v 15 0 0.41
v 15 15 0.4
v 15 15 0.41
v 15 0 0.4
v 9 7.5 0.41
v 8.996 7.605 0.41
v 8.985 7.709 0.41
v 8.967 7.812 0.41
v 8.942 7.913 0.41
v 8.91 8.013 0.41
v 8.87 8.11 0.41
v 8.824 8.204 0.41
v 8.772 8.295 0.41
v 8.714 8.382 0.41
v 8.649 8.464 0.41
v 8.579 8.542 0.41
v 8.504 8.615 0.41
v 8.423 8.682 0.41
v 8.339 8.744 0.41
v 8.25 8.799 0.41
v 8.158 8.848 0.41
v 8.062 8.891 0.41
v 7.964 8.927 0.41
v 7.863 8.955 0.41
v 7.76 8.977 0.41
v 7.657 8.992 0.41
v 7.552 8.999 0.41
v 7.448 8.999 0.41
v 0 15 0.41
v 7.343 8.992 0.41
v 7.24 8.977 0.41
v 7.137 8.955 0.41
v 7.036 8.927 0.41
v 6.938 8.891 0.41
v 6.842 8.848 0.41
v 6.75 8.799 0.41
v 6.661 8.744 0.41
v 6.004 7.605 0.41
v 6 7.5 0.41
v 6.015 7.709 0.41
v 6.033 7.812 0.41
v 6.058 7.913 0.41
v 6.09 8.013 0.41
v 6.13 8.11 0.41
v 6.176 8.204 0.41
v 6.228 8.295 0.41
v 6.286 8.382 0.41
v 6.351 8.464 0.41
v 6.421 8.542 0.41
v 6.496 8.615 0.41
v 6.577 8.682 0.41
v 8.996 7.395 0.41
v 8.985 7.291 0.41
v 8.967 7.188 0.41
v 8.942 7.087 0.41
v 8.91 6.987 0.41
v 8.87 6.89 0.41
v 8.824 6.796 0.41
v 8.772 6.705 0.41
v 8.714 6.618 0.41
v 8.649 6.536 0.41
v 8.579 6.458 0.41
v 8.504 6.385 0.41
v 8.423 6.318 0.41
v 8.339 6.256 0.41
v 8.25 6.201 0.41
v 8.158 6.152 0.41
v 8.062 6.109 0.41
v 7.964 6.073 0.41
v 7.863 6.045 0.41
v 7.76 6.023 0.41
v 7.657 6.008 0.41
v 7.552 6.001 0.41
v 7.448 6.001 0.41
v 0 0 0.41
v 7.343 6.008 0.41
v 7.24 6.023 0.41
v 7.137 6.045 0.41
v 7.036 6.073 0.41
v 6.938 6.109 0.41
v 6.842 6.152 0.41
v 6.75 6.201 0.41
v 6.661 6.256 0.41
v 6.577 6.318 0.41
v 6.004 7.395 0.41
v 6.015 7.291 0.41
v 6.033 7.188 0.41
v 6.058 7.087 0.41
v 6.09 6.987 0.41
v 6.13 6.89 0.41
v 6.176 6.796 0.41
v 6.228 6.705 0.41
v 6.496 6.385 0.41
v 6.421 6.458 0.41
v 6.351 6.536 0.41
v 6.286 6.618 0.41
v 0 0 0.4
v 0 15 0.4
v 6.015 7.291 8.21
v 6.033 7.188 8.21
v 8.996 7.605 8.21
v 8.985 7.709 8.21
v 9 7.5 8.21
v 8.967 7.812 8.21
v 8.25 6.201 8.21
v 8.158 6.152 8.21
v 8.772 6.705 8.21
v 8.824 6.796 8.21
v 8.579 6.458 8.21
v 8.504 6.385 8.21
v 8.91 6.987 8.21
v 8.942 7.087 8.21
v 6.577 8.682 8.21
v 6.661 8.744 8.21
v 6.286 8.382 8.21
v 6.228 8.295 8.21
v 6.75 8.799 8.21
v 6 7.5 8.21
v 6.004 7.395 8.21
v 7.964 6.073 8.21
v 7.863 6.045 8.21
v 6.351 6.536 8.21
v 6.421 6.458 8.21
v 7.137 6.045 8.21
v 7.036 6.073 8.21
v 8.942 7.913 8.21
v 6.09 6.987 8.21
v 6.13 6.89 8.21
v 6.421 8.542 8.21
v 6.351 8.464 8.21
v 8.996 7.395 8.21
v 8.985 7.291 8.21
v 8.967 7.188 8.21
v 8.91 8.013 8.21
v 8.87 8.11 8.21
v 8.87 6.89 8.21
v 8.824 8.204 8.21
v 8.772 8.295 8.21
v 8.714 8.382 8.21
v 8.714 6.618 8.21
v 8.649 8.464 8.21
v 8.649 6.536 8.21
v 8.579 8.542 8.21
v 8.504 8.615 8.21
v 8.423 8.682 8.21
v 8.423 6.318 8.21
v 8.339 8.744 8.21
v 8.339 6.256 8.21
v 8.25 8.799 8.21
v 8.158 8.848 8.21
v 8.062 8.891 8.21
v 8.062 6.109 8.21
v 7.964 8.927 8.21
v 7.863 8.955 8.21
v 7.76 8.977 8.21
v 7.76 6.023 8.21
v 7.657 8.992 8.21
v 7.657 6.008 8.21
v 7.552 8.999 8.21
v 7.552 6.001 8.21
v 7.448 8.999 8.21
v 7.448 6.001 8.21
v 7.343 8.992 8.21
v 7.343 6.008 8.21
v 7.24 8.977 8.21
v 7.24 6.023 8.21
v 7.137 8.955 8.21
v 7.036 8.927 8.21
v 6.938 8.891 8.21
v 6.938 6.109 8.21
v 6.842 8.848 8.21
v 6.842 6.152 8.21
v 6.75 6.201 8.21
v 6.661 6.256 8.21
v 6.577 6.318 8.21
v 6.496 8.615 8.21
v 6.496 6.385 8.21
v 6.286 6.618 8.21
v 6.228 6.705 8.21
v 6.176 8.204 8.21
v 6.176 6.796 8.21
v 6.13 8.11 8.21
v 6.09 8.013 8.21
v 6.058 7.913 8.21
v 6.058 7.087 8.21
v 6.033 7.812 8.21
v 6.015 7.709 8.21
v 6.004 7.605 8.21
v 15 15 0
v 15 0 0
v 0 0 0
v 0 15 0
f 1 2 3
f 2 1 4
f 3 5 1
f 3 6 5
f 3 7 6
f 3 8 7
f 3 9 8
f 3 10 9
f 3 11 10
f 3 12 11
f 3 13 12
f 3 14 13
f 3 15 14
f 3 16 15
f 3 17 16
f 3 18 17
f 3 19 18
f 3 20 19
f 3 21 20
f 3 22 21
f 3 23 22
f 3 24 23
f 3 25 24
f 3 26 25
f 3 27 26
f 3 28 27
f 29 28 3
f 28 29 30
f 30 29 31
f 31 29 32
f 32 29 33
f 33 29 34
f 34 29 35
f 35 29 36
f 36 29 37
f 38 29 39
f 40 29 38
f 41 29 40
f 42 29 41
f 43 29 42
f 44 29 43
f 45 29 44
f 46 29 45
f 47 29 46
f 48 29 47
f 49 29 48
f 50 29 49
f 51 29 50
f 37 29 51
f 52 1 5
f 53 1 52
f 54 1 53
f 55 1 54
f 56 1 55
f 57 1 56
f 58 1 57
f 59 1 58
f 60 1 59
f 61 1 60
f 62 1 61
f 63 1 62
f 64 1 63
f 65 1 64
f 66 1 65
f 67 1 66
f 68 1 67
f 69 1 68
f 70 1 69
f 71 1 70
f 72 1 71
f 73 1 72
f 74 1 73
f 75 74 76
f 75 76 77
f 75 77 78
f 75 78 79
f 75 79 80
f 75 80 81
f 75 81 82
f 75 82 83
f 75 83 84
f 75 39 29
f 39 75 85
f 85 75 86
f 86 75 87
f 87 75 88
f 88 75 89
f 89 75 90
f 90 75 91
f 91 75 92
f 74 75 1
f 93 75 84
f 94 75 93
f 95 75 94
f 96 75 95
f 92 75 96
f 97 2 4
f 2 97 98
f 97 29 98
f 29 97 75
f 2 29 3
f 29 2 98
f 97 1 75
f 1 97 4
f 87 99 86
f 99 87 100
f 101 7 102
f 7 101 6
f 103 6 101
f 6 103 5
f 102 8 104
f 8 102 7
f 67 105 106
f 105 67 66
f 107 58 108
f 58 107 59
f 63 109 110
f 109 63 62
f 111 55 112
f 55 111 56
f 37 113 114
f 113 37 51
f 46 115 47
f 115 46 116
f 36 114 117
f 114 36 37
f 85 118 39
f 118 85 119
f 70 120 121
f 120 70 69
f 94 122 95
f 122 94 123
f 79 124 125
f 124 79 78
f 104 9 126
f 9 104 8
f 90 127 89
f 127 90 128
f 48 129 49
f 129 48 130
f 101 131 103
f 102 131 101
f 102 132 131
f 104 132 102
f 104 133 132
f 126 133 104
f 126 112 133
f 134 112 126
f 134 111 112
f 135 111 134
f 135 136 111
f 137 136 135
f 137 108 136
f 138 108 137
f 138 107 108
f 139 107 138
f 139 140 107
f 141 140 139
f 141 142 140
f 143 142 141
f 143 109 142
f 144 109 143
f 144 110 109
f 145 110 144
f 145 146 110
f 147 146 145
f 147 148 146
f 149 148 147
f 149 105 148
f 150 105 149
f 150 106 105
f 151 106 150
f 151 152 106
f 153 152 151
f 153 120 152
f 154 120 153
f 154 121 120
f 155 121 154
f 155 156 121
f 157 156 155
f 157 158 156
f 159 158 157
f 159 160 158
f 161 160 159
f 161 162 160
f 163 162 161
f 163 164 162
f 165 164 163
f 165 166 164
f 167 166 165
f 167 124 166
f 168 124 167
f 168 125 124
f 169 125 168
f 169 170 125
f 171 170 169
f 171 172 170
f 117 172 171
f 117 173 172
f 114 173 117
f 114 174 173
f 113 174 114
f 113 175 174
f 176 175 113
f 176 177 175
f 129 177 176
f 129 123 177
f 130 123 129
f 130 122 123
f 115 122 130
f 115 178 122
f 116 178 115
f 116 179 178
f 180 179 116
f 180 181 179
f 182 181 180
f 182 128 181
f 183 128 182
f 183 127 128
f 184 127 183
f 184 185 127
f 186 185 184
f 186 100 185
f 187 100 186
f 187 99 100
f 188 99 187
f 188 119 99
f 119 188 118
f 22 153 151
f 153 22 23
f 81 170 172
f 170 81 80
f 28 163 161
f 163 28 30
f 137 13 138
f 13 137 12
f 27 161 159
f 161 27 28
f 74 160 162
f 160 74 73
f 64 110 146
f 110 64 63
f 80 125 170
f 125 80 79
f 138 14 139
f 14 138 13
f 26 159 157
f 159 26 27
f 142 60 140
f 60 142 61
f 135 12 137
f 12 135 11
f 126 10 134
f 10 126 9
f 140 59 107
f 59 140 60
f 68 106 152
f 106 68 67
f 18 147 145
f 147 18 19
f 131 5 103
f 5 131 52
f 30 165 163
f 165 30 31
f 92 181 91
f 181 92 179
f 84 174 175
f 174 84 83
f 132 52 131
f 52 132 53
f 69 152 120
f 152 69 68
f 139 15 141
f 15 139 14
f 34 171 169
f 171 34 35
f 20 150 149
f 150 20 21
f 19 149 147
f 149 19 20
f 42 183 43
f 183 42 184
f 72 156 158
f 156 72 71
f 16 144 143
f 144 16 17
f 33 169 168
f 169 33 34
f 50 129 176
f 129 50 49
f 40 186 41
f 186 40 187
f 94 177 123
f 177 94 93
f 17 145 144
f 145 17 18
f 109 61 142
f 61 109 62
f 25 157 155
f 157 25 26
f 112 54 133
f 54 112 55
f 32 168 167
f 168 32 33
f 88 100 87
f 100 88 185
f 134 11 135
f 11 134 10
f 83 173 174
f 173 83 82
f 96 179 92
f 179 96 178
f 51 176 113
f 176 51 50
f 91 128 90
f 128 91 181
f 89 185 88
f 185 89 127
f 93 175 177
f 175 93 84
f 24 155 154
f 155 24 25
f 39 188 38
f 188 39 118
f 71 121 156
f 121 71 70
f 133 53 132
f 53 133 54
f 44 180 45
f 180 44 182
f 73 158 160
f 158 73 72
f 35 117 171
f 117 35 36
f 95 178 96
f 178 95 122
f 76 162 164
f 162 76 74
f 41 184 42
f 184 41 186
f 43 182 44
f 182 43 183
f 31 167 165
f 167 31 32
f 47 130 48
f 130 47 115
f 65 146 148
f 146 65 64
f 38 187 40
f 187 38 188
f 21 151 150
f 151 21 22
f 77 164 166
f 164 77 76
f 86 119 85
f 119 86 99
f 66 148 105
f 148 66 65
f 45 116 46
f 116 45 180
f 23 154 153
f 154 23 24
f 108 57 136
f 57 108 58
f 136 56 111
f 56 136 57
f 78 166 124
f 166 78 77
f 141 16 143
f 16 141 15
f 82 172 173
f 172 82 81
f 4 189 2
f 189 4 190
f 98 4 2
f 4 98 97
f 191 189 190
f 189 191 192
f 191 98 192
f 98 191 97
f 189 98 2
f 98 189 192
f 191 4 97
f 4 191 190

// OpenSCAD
// file: ../../Base/Boxes.scad
// Fischertechnik Box Foundation
// Pre-designed Boxes

use <Constants.scad>

include <PlacementOptions.scad>

box190Width = 190;
box190Depth = 130;
box130Width = 130;
box130Depth = 95;
boxUsageHeight = 33.9;
boxWallThickness = 2.4;
boxBaseThickness = 1.0;
boxWebWidth = 3.0;

// getBoxWallThickness()
// Gets the wall thickness of a Fischertechnik Box

function getBoxWallThickness() = boxWallThickness;

// Gets the usable height of a fischertechnik box
function getBoxUsageHeight() = boxUsageHeight;

// Gets the thickness of the Fischertechnik box base.
function getBoxBaseThickness() = boxBaseThickness;

// Gets the width of a box web
function getBoxWebWidth() = boxWebWidth;

// Gets the usable inner space of a Box 190 as an x/y-list
function getBox190Space() = [
    box190Width - 2*getBoxWallThickness(), 
    box190Depth - 2*getBoxWallThickness() ];

// Imports the Fischertechnik empty box 130x190 mm and places it at position 0,0
// 190x130 are the outer sizes, the inner space is slightly smaller. Use getBox190Space() to get the inner sizes.
// This module needs the STL file "Fischertechnik Box 130x190.stl" in the library path.
// The box is positioned that the usable inner space is at the 0,0,0 position. The

module Box190() {
    translate([-getBoxWallThickness(),-getBoxWallThickness(),-getBoxBaseThickness()])
        import("Fischertechnik Box 130x190.stl", convexity=3);
}

// Gets the usable inner space of a Box 130 as an x/y-list
function getBox130Space() = [
    box130Width - 2*getBoxWallThickness(), 
    box130Depth - 2*getBoxWallThickness() ];

// Imports the Fischertechnik empty box 95x130 mm and places it at position 0,0
// 190x130 are the outer sizes, the inner space is slightly smaller. Use getBox190Space() to get the inner sizes.
// This module needs the STL file "Fischertechnik Box 95x130.stl" in the library path.
// The box is positioned that the usable inner space is at the 0,0,0 position. The

module Box130() {
    translate([-getBoxWallThickness(),-getBoxWallThickness(),-getBoxBaseThickness()])
        import("Fischertechnik Box 95x130.stl", convexity=3);
}

// Creates a web at the specified box walls
// corner 0 = LowerLeft, 1 = UpperLeft, 2 = UpperRight, 3 = LowerRight
// side 0 = LeftOfCorner, 1 = RightOfCorner
// distance = Distance in mm from the corner
// box = inner width and depth of the box (default: Box 190)
// webWidth = length of the web (default is 3 mms)
// webThickness = thickness of the web (default is 1 mm)

module BoxWeb(corner, side, distance, box=getBox190Space(), webWidth=getBoxWebWidth(), webThickness=1.0) {
    sink = getBoxWallThickness()/2;

    width = (corner % 2 == 0) ? 
            (side == LeftOfCorner ? webWidth : webThickness) :
            (side == LeftOfCorner ? webThickness : webWidth);

    depth = (corner % 2 == 0) ? 
            (side == RightOfCorner ? webWidth : webThickness) :
            (side == RightOfCorner ? webThickness : webWidth);
    
    xDiff = corner == LowerLeft ? 
                (side == LeftOfCorner ? -sink : distance) :
            (corner == UpperLeft ?                
                (side == LeftOfCorner ? distance : -sink) :
            (corner == UpperRight ?
                (side == LeftOfCorner ? box.x-webWidth+sink : box.x-distance-webThickness) :
                (side == LeftOfCorner ? box.x-distance-webThickness: box.x-webWidth+sink)));

    yDiff = corner == LowerLeft ? 
                (side == RightOfCorner ? -sink : distance) :
            (corner == UpperLeft ?
                (side == RightOfCorner ? box.y-distance : box.y-webWidth+sink) :
            (corner == UpperRight ?
                (side == RightOfCorner ? box.y-webWidth+sink : box.y-distance) :
                (side == RightOfCorner ? distance : -sink)));
    
    translate([xDiff, yDiff, -getExcess()])
        cube([width, depth, boxUsageHeight + 2*getExcess()]);
}
// file: ../../Base/Rotation.scad
// Fischertechnik Box Foundation
// Geometry Helpers Rotation

include <PlacementOptions.scad>

// getRotatedSpace(space, rotation=NoRotation)
// Rotates the space dependent on the specified rotation

function getRotatedSpace(space, rotation=NoRotation) = [
    (rotation == Rotate90 || rotation == Rotate270) ? space.y : space.x,
    (rotation == Rotate90 || rotation == Rotate270) ? space.x : space.y
];

// Rotates the given space around the fixed left lower corner
// space = the space the children needs as width/depth list [width,depth]
// rotation = 0 Rotate0 degrees, 1 Rotate90 degrees, 2 Rotate180 degrees, 3 Rotate270 degrees (equivalent to -90)

module RotateFix(space, rotation=Rotate0) {
    dy = (rotation == Rotate0 || rotation == Rotate270) ? 0 :
        (rotation == Rotate90) ? space.x :
        space.y;
    dx = (rotation < Rotate180) ? 0 :
        (rotation == Rotate180) ? space.x :
        space.y;
    
    translate([dx, dy, 0])
        rotate([0, 0, rotations[rotation]])
            children();
}
// file: ../../Base/Alignment.scad
// Fischertechnik Box Foundation
// Geometry Helpers Alignment

include <PlacementOptions.scad>

// getAlignedX(elementWidth, spaceWidth, align=AlignRight, offset=0)
// Gets the aligned X offset of an element with the given
// width in the given space.
// elementWidth = The width of the element to positon
// spaceWidth = The space where the element should be aligned
// align = 0 AlignLeft, 1 AlignCenter, 2 AlignRight
// offset = an optional offset from the aligned position. When
// aligned left or centered, then positive values are in X direction.
// When aligned right then positive values are in negative X direction.

function getAlignedX(elementWidth, spaceWidth, align=AlignRight, offset=0) =
    (align == AlignLeft) ?
        offset :
        ((align == AlignCenter) ?
        (spaceWidth - elementWidth)/2 + offset :
        spaceWidth - offset - elementWidth);

// getAlignedY(elementDepth, spaceDepth, align=AlignTop, offset=0)
// Gets the aligned Y offset of an element with the given
// depth in the given space.
// elementDepth = The depth of the element to positon
// spaceDepth = The space where the element should be aligned
// align = 0 AlignBottom, 1 AlignCenter, 2 AlignTop
// offset = an optional offset from the aligned position. When
// aligned bottom or centered, then positive values are in Y direction.
// When aligned top then positive values are in negative Y direction.

function getAlignedY(elementDepth, spaceDepth, align=AlignTop, offset=0) =
    (align == AlignBottom) ?
        offset :
        ((align == AlignCenter) ?
        (spaceDepth - elementDepth)/2 + offset :
        spaceDepth - offset - elementDepth);
// file: ../../Base/PlacementOptions.scad
// Fischertechnik Box Foundation
// Placement Options

// Alignment
NoAlign = 0;
AlignLeft = 1;
AlignBottom = 2;
AlignCenter = 3;
AlignRight = 4;
AlignTop = 5;

// Element rotation degree steps
rotations = [0, -90, -180, -270];

// Rotation
NoRotation = 0;
Rotate0 = 0;
Rotate90 = 1;
Rotate180 = 2;
Rotate270 = 3;

// Docking (seen from above)
NoDock = -1;
DockLeft = 0;
DockTop = 1;
DockRight = 2;
DockCorner = 2;
DockBottom = 3;

// Web corners
LowerLeft = 0;
UpperLeft = 1;
UpperRight = 2;
LowerRight = 3;

// Web position relative to corner
LeftOfCorner = 0;
RightOfCorner = 1;
// file: ../../Base/Placement.scad
// Fischertechnik Box Foundation
// Geometry Helpers Placement

use <Constants.scad>
use <Alignment.scad>
use <Rotation.scad>
use <Boxes.scad>

include <PlacementOptions.scad>

// Place(x=0, y=0, elementSpace=[0,0], alignX=AlignLeft, alignY=AlignBottom, rotation=Rotate0, boxSpace=getBox190Space())
// Places the child at the specified position
// y = Y-Position. This is a relative position when an X aligment is specified.
// x = X-Position. This is a relative position when an Y aligment is specified.
// elementSpace = space of the element to be placed [x,y]
// alignX = -1=NoAlign, 0 AlignLeft, 1 AlignCenter, 3 AlignRight (elementSpace and boxSpace required!)
// alignY = -1=NoAlign, 2 AlignBottom, 1 AlignCenter, 4 AlignTop (elementSpace and boxSpace required!)
// rotation = 0 Rotate0 0 degrees, 1 Rotate90 90 degrees, 
// 2 Rotate180 180 degrees, 3 Rotate270 270 degrees (equivalent to -90)
// boxSpace = Inner space of the box where the placement occurs [x,y] - default is Box 190x130 inner space

module Place(x=0, y=0, elementSpace=[0,0], 
  alignX=AlignLeft, alignY=AlignBottom, 
  rotation=NoRotation, boxSpace=getBox190Space()) {

    module Position(x, y, space, rotation=Rotate0) {
        translate([x, y, 0])
            RotateFix(space, rotation)
                children();
    }

    space = getRotatedSpace(elementSpace, rotation);
    alignedX = getAlignedX(space.x, boxSpace.x, alignX, x);
    alignedY = getAlignedY(space.y, boxSpace.y, alignY, y);
    Position(alignedX, alignedY, elementSpace, rotation)
        children();
}

// Center(space=getBox130Space(), elementSpace=[0,0])
// space = Space where the children is centered. For cylinder use centered=true and no elementSpace.
// elementSpace = space of the element to be centered [x,y]

module Center(space=getBox190Space(), elementSpace=[0,0]) {
    translate([(space.x - elementSpace.x) / 2, (space.y - elementSpace.y) / 2])
        children(0);
}

// CenterHorizontal(width=0, y=0, offset=0, space=getBox130Space())
// space = Space where the children is centered. For cylinder use centered=true and no elementSpace.
// elementSpace = space of the element to be centered [x,y]

module CenterHorizontal(width=0, y=0, offset=0, space=getBox190Space()) {
    translate([(space.x - width) / 2 + offset, y])
        children(0);
}

// CenterVertical(depth=0, x=0, offset=0, space=getBox130Space())
// space = Space where the children is centered. For cylinder use centered=true and no elementSpace.
// elementSpace = space of the element to be centered [x,y]

module CenterVertical(depth=0, x=0, offset=0, space=getBox190Space()) {
    translate([x, (space.y - depth) / 2 + offset])
        children(0);
}
// file: ../../Elements/AxisClip10.scad
// Fischertechnik Box Library
// Axis for clip 10
// 31023

use <../ModelBase/Simple.scad>

width = 12;
depth = 12;
height = 23;

// getAxisClip10Space()
// Gets the space of a frame for a clip 10 with spring ring (mot2)

function getAxisClip10Space() = [width, depth, height];

// AxisClip10()
// Axis for clip 10 with spring ring (mot2)

module AxisClip10() {
    LeveledAxisWithSpace(height, height-10, getAxisClip10Space());
}

// Tests
color("lightgray")
AxisClip10();
// file: ../../Base/Constants.scad
// Fischertechnik Box Foundation
// Constants

// Constant values necessary for multiple elements

// Base constants
dividerThickness = 1.2;
excess = 0.01;
fragments = 90;
tolerance = 0.8;

// Gets the thickness of a divider 
function getDividerThickness() = dividerThickness;

// Gets the excess that is used to merge walls into each other
function getExcess() = excess;

// Gets amount of fragments of a cylinder
function getFragments() = fragments;

// Gets the inner tolerance of a frame to each side
function getTolerance() = tolerance;


// Fischertechnik specific constants
axisDiameter = 4;
axisBottomDiameter = axisDiameter + 1;
standardEdgeDistance = 2.5;
standardWebDistance = 11.5;
standardCornerLength = 15;
tubeWallFactor = 0.8;

// Gets axis diameter
function getAxisDiameter() = axisDiameter;

// Gets axis bottom diameter for thicker part at the bottom
function getAxisBottomDiameter() = axisBottomDiameter;

// gets the standard distance to the wall of the box for dockable frames with webs
function getStandardEdgeDistance() = standardEdgeDistance;

// gets the standard distance of each web to the corner of the dockable frame
function getStandardWebDistance() = standardWebDistance;

// gets the standard length of the corner walls of a dockable frame
function getStandardCornerLength() = standardCornerLength;

// gets the wall thickness of a tube.
function getTubeWallThickness() = tubeWallFactor * getDividerThickness();
// file: ../../Elements/AxisDial.scad
// Fischertechnik Box Library
// Axis for Dial for Electronic Building Blocks
// 36388

use <../Base/Constants.scad>
use <../ModelBase/Simple.scad>

space = 15;

// getAxisDialSpace()
// Gets the space the axis for a dial needs as width and depth (.x and .y as a list)

function getAxisDialSpace() = [space, space];

// AxisDial()
// Standing axis for a dial 36388

module AxisDial() {
    height = 7.8;
    axisDiameter = 3;
    AxisWithSpace(height, getAxisDialSpace(), diameter=axisDiameter);
}

// Tests
color("lightgray")
AxisDial();
// file: ../TestPrint.scad
// 3D Print Test Base

use <../Base/Constants.scad>

use <../Elements/AxisClip10.scad>

module TestPrint(elementSpace) {
    cube([elementSpace.x, elementSpace.y, 0.4]);
    translate([0,0,0.4+getExcess()]) {
        children();
    }
}

TestPrint(getAxisClip10Space())
    AxisClip10();
// main file
// 3D Print Test
// AxisDial

use <../TestPrint.scad>
use <../../Elements/AxisDial.scad>

TestPrint(getAxisDialSpace())
    AxisDial();
